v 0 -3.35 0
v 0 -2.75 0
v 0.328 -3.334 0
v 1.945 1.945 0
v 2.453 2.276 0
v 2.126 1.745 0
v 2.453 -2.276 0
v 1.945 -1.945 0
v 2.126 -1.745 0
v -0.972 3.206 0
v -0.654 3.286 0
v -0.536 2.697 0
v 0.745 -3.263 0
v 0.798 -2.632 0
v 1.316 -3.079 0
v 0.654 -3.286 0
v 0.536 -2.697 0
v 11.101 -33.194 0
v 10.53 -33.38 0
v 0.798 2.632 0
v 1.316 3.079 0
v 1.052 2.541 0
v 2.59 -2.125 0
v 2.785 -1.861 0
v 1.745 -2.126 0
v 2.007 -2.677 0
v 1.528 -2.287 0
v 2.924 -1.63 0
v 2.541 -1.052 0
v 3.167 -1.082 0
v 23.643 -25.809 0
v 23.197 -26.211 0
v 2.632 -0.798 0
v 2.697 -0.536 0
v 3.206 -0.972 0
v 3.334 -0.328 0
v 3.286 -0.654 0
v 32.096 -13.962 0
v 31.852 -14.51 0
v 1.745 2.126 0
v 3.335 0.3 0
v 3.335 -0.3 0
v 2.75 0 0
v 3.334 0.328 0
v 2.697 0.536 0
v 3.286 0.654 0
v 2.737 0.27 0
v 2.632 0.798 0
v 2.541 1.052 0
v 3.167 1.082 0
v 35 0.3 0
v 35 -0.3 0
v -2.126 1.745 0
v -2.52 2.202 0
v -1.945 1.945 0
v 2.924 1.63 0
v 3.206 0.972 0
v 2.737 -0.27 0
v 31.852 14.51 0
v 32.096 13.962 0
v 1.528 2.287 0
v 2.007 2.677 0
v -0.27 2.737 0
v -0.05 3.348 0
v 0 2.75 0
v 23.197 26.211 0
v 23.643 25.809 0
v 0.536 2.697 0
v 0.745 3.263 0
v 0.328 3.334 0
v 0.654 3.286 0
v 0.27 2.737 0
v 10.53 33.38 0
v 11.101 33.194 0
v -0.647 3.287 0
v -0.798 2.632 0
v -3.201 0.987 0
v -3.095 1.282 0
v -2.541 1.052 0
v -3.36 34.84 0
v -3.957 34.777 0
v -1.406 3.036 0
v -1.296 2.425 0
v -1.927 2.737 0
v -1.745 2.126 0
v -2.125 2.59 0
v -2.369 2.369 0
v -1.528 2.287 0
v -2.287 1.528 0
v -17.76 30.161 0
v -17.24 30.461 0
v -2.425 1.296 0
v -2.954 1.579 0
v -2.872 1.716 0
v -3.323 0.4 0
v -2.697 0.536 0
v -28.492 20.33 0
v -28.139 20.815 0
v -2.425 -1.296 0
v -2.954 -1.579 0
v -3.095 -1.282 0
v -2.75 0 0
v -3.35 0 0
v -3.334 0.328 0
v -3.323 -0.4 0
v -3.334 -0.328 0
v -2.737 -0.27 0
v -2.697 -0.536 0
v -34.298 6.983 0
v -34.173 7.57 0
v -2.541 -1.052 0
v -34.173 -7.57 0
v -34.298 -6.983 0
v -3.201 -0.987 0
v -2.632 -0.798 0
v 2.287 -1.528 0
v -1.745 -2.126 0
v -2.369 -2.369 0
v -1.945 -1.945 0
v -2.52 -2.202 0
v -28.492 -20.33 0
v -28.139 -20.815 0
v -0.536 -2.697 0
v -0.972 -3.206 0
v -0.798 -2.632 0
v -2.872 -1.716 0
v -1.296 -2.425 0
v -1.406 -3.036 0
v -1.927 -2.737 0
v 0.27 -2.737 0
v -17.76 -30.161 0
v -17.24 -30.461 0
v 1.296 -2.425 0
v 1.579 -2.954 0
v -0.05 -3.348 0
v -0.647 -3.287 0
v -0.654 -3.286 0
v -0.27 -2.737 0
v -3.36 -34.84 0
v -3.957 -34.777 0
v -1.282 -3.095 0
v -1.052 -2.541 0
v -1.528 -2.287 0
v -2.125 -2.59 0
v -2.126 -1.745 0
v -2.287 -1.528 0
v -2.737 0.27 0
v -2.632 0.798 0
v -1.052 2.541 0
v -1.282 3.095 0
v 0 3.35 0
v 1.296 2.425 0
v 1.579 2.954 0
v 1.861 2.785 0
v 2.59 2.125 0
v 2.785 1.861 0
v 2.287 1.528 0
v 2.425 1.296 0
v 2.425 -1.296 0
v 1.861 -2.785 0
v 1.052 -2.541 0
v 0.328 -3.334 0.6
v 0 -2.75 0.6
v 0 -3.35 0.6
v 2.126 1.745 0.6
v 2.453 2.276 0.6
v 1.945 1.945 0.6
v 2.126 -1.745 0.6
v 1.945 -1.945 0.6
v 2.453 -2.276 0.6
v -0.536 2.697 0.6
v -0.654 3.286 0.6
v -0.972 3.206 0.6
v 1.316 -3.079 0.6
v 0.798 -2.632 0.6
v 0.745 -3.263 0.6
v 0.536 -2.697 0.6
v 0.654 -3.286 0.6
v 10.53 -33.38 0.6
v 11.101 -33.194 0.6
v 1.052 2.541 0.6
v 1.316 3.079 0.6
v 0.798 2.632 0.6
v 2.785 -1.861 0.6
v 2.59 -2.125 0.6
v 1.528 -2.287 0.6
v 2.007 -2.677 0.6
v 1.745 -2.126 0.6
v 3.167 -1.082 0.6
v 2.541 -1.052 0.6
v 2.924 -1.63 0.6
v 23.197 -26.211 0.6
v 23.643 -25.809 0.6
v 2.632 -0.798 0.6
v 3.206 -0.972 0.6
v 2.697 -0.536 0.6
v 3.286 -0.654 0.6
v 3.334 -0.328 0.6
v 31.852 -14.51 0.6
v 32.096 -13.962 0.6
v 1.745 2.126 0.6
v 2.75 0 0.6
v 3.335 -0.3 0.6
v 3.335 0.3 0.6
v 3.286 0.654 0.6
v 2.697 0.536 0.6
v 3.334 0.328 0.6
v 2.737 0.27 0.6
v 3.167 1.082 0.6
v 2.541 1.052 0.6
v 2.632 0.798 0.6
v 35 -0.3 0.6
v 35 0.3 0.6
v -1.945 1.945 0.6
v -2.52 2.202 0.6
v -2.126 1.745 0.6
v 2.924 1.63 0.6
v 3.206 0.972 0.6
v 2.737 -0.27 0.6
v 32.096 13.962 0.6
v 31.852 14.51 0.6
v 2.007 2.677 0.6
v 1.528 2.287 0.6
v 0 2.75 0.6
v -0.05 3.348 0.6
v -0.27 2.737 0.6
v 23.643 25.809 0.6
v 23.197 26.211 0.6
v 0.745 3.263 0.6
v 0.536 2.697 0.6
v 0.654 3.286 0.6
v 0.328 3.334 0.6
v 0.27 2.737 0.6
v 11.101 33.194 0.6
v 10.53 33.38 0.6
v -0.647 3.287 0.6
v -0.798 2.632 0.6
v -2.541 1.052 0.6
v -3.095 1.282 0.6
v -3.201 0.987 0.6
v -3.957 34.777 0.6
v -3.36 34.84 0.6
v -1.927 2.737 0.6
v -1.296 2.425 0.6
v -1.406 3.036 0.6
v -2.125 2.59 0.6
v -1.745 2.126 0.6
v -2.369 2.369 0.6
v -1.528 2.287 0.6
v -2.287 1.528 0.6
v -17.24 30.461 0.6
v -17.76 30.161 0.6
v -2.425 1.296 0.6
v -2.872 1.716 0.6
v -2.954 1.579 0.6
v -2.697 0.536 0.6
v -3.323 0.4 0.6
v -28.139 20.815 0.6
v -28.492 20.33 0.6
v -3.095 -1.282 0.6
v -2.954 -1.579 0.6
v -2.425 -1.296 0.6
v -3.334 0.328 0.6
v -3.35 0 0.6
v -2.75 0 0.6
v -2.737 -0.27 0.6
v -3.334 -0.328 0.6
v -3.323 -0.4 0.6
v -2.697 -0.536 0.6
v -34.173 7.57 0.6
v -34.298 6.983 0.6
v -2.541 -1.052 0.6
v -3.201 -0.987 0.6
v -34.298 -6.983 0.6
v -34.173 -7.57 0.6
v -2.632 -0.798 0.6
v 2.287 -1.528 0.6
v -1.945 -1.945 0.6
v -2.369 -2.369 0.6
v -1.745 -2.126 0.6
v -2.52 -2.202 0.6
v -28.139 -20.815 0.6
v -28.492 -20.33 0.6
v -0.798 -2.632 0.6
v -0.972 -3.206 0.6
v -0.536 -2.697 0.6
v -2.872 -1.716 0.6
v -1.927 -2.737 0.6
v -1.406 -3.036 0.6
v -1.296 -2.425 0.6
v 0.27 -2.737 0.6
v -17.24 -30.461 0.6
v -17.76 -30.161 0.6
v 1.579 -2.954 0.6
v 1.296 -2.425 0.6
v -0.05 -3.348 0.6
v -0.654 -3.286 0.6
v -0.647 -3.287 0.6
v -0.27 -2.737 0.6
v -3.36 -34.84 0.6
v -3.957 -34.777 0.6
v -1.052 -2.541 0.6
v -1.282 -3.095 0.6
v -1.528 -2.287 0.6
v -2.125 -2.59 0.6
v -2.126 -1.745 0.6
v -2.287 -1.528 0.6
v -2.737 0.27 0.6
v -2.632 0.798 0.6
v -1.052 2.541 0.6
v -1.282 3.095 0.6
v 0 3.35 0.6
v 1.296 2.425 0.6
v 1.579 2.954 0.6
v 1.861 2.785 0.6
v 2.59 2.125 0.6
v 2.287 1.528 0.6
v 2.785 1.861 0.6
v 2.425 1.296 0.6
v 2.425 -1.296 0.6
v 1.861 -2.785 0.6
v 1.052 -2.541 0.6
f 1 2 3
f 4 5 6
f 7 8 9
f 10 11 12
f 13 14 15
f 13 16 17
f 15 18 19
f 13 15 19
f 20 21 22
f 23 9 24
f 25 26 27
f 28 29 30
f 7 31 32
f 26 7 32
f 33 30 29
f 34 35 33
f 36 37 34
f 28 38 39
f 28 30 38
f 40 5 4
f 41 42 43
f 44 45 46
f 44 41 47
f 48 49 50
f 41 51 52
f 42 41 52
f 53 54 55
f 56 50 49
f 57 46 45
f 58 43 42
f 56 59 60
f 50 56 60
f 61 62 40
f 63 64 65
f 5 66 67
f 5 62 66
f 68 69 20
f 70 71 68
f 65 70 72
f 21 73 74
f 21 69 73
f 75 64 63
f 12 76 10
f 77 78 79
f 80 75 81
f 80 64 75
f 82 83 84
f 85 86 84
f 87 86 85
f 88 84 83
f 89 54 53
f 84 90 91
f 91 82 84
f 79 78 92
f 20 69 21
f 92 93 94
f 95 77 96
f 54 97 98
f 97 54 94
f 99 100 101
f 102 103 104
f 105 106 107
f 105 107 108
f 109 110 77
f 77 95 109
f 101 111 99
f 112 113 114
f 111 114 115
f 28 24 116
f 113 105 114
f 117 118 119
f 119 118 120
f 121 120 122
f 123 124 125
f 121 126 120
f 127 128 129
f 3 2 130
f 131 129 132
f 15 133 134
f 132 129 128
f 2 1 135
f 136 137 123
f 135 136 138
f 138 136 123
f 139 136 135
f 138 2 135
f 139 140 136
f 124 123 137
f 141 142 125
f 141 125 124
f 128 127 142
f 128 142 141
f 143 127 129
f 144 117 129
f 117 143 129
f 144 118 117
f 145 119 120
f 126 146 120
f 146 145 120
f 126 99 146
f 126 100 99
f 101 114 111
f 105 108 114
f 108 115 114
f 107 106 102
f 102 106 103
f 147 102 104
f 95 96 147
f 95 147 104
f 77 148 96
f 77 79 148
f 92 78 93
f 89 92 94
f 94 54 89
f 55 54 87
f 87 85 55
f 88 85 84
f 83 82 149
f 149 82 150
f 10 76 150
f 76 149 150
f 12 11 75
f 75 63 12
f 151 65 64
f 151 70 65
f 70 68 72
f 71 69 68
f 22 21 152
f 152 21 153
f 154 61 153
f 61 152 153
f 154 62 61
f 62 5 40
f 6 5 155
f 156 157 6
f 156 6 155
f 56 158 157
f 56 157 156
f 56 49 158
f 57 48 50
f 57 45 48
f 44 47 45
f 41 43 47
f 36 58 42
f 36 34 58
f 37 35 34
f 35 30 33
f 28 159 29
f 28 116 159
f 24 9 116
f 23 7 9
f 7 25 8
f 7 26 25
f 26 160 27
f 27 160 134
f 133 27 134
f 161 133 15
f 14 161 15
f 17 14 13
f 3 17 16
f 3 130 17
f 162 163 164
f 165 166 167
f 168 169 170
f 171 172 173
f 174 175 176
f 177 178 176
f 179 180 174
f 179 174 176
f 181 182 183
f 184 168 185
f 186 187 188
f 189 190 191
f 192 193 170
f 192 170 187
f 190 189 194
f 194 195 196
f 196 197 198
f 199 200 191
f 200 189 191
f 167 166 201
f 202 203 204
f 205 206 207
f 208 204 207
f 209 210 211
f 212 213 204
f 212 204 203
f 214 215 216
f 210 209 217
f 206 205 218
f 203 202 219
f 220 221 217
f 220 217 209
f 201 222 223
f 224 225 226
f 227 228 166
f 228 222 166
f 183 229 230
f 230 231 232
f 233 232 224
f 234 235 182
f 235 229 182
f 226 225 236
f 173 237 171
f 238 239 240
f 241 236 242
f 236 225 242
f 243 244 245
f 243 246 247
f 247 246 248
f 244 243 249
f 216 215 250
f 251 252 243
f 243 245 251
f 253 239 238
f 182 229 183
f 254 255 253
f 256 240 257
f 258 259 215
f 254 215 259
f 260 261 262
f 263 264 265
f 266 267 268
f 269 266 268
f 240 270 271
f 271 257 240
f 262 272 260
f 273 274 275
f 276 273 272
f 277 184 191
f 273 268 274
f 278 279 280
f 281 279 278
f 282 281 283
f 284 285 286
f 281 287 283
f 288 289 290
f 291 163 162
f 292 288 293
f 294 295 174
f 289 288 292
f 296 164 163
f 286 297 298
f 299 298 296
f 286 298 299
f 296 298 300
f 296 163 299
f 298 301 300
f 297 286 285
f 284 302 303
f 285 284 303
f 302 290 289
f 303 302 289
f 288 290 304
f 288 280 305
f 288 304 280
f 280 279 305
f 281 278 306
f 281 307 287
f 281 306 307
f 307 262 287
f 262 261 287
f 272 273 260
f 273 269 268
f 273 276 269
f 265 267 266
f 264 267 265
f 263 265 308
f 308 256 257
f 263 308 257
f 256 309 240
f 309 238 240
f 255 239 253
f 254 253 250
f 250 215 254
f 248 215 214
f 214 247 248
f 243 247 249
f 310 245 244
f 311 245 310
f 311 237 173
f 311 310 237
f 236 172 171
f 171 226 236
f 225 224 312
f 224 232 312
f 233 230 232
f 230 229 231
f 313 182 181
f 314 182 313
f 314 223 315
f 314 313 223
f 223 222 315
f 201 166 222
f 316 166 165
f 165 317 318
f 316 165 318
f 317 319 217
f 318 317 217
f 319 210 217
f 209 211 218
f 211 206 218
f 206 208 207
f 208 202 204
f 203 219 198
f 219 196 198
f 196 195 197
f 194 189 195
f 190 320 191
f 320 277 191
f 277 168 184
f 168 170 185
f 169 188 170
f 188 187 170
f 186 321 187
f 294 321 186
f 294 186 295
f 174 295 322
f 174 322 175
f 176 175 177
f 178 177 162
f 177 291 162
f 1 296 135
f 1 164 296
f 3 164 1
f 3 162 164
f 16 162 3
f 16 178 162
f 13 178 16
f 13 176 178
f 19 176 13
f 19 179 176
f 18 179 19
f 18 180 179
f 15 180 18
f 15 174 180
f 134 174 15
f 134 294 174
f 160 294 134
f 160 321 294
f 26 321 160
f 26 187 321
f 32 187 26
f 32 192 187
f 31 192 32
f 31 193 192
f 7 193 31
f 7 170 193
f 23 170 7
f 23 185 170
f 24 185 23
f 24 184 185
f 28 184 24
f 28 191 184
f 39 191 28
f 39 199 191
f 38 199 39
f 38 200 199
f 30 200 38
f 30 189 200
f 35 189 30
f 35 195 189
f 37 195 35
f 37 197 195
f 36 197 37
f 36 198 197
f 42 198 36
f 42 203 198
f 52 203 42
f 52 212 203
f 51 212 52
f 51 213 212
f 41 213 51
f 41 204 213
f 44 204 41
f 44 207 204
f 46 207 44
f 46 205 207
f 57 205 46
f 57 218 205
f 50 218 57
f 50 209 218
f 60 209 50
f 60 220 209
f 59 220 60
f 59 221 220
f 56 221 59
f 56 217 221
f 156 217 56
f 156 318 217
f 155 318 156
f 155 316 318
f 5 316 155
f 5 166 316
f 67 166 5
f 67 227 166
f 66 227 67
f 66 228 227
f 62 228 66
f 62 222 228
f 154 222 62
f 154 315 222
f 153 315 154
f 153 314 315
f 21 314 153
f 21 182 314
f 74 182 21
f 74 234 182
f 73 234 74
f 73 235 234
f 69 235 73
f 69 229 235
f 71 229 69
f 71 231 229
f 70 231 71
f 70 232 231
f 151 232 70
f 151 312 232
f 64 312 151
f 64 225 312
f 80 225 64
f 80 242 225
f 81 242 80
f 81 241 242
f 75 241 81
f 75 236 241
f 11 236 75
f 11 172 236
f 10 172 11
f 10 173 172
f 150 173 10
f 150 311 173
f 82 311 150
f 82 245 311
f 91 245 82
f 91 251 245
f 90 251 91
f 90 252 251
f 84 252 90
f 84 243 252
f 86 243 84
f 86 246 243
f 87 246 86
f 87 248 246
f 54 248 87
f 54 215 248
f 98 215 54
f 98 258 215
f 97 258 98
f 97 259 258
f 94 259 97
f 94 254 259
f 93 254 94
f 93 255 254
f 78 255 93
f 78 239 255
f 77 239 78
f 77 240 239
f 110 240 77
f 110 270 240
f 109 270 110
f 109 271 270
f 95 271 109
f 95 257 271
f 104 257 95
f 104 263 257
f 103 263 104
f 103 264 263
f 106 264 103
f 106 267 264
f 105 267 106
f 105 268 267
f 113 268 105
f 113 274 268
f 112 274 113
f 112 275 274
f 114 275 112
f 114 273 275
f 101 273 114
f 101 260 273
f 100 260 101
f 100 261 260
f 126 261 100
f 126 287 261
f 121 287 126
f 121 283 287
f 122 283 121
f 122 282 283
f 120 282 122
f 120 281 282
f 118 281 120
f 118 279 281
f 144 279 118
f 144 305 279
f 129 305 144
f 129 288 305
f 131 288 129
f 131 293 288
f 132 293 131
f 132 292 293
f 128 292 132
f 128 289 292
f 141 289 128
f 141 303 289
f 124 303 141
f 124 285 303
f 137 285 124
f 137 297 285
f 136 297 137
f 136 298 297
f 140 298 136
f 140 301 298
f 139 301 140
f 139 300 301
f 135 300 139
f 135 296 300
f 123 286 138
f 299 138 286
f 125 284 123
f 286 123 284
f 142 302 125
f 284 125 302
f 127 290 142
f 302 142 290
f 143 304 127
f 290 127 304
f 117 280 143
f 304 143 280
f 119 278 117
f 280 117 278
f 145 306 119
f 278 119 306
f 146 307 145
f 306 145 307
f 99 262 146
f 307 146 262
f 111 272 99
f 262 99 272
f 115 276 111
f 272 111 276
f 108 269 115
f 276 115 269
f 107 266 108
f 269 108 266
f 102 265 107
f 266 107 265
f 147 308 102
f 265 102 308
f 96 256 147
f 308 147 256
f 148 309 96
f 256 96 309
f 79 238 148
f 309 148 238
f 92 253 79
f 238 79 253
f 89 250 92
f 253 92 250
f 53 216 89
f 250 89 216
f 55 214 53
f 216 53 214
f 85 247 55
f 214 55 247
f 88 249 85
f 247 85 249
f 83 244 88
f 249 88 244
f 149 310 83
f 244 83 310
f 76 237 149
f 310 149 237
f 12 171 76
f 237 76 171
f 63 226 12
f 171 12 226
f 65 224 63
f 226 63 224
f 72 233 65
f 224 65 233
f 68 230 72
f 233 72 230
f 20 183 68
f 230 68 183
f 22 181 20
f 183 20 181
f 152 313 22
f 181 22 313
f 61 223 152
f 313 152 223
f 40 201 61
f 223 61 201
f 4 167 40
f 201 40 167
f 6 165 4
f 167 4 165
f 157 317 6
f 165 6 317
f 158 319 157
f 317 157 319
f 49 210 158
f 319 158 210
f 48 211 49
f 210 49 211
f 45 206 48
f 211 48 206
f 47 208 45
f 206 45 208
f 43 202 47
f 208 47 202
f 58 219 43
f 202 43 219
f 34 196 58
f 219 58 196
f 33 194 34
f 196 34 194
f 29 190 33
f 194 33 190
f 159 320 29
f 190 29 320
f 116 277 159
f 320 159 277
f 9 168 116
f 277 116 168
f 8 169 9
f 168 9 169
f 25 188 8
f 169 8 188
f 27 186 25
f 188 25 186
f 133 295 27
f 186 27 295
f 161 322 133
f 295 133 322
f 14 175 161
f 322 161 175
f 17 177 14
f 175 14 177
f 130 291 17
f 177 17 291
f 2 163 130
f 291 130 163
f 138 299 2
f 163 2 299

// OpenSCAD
$fn = $preview ? 16 : 64;

depth = 0.6;
stem_diameter = 5.5;
stem_ring_thickness = 0.6;
branch_length = 35;
branch_width = 0.6;
number_branches = 15;

module branch() {
  translate([0, - branch_width / 2])
    square([branch_length, branch_width]);
}

linear_extrude(depth) {
  difference() {
    union() {
      circle(stem_diameter / 2 + stem_ring_thickness);
      for(i = [0 : number_branches - 1])
        rotate([0, 0, 360 / number_branches * i]) branch();
    }
    circle(stem_diameter / 2);
  }
}
